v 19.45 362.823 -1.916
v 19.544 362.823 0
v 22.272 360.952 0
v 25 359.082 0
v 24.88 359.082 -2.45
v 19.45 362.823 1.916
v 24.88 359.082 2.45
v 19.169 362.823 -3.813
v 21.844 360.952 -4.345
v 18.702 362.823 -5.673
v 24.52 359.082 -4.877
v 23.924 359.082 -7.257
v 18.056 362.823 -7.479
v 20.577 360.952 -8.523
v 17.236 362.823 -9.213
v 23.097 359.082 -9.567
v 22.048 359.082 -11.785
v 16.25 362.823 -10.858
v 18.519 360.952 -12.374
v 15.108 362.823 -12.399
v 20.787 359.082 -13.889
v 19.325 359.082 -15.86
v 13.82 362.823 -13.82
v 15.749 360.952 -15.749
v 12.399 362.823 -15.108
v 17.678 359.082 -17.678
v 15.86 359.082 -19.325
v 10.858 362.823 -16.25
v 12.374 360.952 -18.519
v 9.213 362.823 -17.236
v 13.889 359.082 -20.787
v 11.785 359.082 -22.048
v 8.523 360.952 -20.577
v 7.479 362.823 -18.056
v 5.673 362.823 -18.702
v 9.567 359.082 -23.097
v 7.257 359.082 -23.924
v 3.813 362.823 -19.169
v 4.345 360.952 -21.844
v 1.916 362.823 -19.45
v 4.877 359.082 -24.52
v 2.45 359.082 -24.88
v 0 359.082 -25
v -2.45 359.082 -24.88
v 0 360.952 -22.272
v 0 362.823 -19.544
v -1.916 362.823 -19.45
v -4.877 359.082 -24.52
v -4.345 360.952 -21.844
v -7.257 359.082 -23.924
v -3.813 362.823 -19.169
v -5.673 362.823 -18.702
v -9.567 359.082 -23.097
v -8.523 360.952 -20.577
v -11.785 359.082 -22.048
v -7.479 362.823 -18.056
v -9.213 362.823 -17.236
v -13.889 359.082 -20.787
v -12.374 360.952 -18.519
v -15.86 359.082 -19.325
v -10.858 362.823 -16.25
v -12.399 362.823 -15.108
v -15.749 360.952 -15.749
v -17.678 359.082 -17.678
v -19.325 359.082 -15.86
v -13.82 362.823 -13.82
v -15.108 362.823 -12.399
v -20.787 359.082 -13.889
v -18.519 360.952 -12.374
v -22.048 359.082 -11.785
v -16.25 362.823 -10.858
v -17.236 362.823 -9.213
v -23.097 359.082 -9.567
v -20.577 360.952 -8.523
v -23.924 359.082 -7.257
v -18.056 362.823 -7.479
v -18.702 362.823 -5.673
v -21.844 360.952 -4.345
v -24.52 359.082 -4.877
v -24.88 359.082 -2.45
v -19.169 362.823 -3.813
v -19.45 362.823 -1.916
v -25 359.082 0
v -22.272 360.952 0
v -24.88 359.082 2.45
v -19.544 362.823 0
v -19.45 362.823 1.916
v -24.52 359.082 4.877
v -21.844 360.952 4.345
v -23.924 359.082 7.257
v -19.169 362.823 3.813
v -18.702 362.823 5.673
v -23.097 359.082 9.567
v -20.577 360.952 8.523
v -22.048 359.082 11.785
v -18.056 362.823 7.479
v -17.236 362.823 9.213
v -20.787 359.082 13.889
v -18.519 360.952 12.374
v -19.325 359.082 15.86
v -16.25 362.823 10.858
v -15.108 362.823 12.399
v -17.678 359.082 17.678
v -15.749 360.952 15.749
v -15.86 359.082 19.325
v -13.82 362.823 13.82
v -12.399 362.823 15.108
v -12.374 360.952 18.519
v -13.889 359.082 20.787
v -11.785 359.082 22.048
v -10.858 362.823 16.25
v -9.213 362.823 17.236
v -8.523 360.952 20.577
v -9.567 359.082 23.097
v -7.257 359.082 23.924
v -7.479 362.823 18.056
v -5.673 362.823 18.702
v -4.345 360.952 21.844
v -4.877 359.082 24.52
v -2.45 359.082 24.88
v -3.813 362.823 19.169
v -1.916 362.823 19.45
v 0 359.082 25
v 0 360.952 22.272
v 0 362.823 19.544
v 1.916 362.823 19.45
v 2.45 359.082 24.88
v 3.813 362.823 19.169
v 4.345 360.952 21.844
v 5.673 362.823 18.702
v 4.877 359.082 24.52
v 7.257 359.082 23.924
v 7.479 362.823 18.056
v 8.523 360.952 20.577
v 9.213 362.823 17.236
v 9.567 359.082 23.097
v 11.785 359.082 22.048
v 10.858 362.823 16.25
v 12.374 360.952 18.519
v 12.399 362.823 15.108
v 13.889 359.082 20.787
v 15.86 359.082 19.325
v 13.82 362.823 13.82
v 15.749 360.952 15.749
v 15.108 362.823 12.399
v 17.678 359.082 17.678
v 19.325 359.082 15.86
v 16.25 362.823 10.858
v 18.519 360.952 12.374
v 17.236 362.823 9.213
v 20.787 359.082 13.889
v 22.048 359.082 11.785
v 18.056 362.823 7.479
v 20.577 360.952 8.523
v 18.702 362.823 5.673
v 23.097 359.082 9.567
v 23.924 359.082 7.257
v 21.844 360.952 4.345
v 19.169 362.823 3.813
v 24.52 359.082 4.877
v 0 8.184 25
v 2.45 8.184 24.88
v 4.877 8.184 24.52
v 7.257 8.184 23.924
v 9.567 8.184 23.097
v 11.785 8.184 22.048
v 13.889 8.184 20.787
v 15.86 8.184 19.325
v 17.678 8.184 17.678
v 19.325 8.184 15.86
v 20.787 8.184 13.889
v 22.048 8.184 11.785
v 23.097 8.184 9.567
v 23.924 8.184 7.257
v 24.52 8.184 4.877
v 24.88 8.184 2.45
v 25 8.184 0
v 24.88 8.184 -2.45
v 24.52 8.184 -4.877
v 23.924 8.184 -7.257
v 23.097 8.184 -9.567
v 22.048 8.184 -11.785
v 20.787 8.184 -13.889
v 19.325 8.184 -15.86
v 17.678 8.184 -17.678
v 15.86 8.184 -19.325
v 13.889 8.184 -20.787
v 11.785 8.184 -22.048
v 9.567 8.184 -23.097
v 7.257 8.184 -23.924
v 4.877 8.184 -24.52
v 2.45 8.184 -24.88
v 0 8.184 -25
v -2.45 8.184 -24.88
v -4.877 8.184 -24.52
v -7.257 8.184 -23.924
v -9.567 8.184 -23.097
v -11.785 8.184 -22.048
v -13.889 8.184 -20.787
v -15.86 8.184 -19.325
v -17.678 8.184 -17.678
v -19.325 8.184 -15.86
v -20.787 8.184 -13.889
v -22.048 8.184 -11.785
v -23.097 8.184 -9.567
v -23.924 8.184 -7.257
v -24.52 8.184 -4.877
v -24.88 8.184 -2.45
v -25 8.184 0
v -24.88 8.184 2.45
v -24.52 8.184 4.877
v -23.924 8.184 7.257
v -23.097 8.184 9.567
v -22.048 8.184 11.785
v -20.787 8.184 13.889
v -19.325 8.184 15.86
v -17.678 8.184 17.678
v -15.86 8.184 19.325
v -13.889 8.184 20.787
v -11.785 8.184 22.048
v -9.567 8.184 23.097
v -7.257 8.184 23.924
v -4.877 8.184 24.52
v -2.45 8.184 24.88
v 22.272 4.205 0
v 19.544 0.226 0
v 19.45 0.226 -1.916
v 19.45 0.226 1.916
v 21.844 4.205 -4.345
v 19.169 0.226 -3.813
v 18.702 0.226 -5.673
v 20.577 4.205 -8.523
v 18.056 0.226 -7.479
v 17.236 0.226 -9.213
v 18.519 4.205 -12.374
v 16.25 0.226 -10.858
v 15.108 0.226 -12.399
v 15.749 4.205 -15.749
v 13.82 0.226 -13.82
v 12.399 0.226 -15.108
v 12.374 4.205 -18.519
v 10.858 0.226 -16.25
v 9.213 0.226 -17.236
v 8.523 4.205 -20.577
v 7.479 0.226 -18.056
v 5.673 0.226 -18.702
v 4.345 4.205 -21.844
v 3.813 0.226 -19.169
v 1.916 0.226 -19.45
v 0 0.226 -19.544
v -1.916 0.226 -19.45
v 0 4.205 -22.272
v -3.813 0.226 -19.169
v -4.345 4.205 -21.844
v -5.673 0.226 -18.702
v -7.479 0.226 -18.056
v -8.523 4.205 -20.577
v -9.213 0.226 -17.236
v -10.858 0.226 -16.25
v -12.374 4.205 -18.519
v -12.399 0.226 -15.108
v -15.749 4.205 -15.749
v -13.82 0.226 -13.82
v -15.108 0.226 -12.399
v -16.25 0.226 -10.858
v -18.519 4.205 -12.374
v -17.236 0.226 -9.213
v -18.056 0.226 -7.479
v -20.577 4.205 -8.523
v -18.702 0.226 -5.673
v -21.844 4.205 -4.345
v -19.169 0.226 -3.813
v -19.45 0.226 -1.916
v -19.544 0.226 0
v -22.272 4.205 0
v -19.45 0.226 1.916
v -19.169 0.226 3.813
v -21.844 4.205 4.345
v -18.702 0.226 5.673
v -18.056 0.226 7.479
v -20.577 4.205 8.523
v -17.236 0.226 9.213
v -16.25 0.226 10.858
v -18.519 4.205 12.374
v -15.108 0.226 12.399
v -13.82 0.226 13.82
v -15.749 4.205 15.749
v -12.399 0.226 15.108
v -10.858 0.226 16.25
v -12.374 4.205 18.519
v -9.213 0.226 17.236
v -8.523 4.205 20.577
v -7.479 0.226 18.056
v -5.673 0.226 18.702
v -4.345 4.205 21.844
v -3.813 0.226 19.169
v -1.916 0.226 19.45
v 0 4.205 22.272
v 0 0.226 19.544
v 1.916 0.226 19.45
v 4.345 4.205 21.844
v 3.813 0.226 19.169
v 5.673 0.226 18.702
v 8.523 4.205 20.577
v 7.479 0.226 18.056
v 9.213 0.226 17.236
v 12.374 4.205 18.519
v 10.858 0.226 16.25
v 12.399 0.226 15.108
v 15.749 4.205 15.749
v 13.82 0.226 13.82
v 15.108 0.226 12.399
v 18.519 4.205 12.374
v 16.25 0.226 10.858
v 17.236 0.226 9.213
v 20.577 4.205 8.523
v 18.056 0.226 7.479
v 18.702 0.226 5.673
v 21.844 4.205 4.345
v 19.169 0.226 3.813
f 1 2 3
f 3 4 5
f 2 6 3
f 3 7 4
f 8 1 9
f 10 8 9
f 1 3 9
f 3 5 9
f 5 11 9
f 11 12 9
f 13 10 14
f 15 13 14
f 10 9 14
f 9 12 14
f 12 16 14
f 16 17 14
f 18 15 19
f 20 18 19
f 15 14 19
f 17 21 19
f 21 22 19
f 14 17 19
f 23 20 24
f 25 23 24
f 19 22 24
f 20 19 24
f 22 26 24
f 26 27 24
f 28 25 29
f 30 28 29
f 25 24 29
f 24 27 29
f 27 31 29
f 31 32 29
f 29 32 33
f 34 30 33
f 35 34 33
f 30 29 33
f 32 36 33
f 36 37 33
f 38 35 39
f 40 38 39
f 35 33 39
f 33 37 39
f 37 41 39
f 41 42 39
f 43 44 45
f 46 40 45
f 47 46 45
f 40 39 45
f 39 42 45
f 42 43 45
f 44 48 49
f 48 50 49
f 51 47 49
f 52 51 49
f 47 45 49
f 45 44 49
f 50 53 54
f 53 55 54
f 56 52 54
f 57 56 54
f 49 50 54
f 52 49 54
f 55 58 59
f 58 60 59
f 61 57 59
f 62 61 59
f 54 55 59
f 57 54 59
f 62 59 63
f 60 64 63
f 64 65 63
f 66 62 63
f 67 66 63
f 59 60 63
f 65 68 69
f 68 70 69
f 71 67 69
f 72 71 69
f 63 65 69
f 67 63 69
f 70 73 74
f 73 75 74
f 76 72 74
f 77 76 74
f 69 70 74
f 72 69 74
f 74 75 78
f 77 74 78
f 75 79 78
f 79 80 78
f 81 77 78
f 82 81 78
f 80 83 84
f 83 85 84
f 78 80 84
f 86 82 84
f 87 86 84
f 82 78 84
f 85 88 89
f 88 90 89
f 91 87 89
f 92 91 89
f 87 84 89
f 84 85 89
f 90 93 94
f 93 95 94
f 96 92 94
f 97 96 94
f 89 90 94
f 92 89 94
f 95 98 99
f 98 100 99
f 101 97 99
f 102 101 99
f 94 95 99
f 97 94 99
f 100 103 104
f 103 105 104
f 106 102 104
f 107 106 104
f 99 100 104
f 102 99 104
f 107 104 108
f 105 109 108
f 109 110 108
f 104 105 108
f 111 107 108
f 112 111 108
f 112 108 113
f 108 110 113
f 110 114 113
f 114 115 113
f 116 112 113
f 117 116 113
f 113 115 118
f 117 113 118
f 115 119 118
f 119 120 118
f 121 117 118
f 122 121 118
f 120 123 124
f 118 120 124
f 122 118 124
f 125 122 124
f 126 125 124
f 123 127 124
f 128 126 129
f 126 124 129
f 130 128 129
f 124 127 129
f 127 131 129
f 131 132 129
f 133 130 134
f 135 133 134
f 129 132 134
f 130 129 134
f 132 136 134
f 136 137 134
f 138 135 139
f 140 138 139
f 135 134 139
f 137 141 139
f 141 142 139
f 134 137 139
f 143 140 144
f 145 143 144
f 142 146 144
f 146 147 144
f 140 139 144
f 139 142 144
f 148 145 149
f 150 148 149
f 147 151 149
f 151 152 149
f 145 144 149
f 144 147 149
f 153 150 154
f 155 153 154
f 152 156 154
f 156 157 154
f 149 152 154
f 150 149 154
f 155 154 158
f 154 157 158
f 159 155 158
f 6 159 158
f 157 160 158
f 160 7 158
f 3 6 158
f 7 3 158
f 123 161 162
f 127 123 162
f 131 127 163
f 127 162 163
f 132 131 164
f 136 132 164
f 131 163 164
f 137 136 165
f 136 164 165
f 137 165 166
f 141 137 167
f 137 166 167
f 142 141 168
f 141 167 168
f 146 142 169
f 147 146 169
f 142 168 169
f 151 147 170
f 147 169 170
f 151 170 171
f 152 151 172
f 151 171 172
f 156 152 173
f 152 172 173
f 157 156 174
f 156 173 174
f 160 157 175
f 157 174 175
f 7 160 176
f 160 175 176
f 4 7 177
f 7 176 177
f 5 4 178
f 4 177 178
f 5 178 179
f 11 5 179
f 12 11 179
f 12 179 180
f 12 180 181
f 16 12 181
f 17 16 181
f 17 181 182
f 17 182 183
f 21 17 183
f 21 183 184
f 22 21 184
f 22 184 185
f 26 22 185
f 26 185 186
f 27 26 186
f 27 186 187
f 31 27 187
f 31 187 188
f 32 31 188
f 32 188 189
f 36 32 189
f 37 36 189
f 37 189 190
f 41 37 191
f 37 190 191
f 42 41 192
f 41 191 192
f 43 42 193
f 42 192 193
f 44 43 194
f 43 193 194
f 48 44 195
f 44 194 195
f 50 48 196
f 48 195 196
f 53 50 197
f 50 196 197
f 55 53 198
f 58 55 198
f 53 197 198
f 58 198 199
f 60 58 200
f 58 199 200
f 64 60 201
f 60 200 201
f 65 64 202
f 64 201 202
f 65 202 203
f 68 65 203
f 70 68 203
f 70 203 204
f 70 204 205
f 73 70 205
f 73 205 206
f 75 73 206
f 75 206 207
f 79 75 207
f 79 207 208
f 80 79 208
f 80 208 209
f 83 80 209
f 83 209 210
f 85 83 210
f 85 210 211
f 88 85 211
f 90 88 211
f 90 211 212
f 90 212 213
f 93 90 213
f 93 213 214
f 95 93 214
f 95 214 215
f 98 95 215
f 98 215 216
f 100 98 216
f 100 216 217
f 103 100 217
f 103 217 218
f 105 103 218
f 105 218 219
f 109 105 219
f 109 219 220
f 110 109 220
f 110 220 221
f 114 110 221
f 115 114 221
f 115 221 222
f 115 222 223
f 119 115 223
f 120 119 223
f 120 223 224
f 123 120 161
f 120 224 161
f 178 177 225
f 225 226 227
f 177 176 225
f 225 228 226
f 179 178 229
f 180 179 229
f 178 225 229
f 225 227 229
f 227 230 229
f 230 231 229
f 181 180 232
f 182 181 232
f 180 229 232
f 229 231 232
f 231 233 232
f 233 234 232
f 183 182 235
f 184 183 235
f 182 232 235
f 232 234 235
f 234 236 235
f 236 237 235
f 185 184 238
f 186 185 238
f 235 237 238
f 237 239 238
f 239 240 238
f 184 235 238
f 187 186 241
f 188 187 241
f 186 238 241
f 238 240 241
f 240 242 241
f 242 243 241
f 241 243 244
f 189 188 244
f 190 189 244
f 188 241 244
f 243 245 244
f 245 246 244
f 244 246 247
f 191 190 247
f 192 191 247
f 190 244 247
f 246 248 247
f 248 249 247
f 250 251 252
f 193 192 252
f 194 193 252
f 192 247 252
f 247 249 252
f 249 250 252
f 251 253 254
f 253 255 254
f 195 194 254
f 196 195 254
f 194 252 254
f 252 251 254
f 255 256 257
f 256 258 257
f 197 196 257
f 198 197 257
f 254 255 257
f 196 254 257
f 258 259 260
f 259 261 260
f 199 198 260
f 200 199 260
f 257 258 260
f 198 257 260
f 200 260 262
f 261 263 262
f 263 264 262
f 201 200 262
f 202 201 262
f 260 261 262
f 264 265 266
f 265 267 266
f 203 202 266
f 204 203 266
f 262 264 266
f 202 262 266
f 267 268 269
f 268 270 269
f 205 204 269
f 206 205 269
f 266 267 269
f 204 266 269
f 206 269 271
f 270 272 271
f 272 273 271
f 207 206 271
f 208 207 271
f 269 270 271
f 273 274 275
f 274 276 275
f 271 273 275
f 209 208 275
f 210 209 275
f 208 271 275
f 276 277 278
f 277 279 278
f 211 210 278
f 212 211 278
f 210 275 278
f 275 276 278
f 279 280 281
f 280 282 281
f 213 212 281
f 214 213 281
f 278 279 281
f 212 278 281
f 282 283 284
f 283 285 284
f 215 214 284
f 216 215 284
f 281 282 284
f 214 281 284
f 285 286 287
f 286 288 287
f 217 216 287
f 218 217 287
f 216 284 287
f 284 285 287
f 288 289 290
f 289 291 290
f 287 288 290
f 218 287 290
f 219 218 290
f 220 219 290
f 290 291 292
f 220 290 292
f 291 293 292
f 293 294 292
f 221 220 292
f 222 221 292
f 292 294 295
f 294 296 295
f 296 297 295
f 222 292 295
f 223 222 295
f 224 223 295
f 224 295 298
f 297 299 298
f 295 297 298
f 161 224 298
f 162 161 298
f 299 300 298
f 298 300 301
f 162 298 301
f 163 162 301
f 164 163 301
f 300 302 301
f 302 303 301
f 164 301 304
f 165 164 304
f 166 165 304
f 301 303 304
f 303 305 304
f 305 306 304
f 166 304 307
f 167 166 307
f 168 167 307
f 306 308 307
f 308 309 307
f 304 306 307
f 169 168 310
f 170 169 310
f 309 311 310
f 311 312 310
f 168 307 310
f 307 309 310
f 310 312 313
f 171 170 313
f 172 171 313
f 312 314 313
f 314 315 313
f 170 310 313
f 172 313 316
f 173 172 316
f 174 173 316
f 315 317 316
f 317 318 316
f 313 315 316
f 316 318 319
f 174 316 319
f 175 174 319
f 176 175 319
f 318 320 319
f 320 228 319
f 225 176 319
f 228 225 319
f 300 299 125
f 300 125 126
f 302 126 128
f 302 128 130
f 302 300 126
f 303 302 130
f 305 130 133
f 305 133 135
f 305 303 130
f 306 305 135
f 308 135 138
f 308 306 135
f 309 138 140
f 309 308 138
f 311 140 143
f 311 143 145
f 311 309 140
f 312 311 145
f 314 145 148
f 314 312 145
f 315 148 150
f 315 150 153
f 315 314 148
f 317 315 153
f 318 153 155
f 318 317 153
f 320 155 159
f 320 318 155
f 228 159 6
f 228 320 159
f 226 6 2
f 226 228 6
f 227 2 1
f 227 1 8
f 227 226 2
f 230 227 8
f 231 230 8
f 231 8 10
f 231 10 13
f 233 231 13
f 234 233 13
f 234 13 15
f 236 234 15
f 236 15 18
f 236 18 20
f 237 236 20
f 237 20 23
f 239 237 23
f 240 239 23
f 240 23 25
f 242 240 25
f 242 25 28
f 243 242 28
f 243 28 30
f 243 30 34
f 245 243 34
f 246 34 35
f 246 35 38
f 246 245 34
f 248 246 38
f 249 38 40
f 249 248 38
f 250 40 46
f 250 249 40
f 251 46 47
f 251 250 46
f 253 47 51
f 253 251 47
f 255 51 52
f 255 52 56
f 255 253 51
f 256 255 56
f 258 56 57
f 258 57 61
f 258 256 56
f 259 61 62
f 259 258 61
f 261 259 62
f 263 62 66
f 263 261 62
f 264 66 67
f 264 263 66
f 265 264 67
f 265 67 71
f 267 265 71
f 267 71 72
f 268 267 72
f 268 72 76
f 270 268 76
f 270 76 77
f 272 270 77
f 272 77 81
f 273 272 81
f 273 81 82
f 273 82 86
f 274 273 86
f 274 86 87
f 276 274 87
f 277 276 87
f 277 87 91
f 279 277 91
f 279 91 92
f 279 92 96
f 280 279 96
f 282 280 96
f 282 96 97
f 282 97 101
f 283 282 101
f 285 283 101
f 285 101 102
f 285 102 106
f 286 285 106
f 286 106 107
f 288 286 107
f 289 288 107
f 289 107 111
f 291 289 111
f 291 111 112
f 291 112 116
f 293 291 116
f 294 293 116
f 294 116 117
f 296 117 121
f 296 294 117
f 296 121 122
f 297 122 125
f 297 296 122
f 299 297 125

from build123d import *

# Parameters (mm, degrees)
SKETCH1_R           = 25
BOSS_EXTRUDE1_DEPTH = 364.692686
SKETCH2_R           = 19.544034105
CUT_EXTRUDE1_DEPTH  = 367.402449803


with BuildPart() as part:
    # Sketch1 → Boss-Extrude1 (new body)
    with BuildSketch(Plane(origin=(0, 0, 0), x_dir=(1, 0, 0), z_dir=(0, 1, 0))):
        with Locations(Location((0, 0, 0), (0, 0, 270))):
            Circle(SKETCH1_R)
    extrude(amount=BOSS_EXTRUDE1_DEPTH)

    # Sketch2 → Cut-Extrude1 (cut, through all)
    with BuildSketch(Plane(origin=(0, 0, 0), x_dir=(1, 0, 0), z_dir=(0, 1, 0))):
        with Locations(Location((0, 0, 0), (0, 0, 270))):
            Circle(SKETCH2_R)
    extrude(amount=CUT_EXTRUDE1_DEPTH, mode=Mode.SUBTRACT)

    # Chamfer1: read off the stored shape, not the designer's step
    # Chamfer1 outline → Chamfer1 (revolve, cut)
    with BuildSketch(Plane.XY):
        Polygon((25, 359.08197147), (25, 364.692686108), (19.544034105, 364.692686108), (19.544034105, 362.822599982), align=None)
        Polygon((25, 8.183616101), (19.544034105, 0.225711764), (19.544034105, 0), (25, 0), align=None)
    revolve(axis=Axis((0, 0, 0), (0, 1, 0)), mode=Mode.SUBTRACT)


solid = part.part
